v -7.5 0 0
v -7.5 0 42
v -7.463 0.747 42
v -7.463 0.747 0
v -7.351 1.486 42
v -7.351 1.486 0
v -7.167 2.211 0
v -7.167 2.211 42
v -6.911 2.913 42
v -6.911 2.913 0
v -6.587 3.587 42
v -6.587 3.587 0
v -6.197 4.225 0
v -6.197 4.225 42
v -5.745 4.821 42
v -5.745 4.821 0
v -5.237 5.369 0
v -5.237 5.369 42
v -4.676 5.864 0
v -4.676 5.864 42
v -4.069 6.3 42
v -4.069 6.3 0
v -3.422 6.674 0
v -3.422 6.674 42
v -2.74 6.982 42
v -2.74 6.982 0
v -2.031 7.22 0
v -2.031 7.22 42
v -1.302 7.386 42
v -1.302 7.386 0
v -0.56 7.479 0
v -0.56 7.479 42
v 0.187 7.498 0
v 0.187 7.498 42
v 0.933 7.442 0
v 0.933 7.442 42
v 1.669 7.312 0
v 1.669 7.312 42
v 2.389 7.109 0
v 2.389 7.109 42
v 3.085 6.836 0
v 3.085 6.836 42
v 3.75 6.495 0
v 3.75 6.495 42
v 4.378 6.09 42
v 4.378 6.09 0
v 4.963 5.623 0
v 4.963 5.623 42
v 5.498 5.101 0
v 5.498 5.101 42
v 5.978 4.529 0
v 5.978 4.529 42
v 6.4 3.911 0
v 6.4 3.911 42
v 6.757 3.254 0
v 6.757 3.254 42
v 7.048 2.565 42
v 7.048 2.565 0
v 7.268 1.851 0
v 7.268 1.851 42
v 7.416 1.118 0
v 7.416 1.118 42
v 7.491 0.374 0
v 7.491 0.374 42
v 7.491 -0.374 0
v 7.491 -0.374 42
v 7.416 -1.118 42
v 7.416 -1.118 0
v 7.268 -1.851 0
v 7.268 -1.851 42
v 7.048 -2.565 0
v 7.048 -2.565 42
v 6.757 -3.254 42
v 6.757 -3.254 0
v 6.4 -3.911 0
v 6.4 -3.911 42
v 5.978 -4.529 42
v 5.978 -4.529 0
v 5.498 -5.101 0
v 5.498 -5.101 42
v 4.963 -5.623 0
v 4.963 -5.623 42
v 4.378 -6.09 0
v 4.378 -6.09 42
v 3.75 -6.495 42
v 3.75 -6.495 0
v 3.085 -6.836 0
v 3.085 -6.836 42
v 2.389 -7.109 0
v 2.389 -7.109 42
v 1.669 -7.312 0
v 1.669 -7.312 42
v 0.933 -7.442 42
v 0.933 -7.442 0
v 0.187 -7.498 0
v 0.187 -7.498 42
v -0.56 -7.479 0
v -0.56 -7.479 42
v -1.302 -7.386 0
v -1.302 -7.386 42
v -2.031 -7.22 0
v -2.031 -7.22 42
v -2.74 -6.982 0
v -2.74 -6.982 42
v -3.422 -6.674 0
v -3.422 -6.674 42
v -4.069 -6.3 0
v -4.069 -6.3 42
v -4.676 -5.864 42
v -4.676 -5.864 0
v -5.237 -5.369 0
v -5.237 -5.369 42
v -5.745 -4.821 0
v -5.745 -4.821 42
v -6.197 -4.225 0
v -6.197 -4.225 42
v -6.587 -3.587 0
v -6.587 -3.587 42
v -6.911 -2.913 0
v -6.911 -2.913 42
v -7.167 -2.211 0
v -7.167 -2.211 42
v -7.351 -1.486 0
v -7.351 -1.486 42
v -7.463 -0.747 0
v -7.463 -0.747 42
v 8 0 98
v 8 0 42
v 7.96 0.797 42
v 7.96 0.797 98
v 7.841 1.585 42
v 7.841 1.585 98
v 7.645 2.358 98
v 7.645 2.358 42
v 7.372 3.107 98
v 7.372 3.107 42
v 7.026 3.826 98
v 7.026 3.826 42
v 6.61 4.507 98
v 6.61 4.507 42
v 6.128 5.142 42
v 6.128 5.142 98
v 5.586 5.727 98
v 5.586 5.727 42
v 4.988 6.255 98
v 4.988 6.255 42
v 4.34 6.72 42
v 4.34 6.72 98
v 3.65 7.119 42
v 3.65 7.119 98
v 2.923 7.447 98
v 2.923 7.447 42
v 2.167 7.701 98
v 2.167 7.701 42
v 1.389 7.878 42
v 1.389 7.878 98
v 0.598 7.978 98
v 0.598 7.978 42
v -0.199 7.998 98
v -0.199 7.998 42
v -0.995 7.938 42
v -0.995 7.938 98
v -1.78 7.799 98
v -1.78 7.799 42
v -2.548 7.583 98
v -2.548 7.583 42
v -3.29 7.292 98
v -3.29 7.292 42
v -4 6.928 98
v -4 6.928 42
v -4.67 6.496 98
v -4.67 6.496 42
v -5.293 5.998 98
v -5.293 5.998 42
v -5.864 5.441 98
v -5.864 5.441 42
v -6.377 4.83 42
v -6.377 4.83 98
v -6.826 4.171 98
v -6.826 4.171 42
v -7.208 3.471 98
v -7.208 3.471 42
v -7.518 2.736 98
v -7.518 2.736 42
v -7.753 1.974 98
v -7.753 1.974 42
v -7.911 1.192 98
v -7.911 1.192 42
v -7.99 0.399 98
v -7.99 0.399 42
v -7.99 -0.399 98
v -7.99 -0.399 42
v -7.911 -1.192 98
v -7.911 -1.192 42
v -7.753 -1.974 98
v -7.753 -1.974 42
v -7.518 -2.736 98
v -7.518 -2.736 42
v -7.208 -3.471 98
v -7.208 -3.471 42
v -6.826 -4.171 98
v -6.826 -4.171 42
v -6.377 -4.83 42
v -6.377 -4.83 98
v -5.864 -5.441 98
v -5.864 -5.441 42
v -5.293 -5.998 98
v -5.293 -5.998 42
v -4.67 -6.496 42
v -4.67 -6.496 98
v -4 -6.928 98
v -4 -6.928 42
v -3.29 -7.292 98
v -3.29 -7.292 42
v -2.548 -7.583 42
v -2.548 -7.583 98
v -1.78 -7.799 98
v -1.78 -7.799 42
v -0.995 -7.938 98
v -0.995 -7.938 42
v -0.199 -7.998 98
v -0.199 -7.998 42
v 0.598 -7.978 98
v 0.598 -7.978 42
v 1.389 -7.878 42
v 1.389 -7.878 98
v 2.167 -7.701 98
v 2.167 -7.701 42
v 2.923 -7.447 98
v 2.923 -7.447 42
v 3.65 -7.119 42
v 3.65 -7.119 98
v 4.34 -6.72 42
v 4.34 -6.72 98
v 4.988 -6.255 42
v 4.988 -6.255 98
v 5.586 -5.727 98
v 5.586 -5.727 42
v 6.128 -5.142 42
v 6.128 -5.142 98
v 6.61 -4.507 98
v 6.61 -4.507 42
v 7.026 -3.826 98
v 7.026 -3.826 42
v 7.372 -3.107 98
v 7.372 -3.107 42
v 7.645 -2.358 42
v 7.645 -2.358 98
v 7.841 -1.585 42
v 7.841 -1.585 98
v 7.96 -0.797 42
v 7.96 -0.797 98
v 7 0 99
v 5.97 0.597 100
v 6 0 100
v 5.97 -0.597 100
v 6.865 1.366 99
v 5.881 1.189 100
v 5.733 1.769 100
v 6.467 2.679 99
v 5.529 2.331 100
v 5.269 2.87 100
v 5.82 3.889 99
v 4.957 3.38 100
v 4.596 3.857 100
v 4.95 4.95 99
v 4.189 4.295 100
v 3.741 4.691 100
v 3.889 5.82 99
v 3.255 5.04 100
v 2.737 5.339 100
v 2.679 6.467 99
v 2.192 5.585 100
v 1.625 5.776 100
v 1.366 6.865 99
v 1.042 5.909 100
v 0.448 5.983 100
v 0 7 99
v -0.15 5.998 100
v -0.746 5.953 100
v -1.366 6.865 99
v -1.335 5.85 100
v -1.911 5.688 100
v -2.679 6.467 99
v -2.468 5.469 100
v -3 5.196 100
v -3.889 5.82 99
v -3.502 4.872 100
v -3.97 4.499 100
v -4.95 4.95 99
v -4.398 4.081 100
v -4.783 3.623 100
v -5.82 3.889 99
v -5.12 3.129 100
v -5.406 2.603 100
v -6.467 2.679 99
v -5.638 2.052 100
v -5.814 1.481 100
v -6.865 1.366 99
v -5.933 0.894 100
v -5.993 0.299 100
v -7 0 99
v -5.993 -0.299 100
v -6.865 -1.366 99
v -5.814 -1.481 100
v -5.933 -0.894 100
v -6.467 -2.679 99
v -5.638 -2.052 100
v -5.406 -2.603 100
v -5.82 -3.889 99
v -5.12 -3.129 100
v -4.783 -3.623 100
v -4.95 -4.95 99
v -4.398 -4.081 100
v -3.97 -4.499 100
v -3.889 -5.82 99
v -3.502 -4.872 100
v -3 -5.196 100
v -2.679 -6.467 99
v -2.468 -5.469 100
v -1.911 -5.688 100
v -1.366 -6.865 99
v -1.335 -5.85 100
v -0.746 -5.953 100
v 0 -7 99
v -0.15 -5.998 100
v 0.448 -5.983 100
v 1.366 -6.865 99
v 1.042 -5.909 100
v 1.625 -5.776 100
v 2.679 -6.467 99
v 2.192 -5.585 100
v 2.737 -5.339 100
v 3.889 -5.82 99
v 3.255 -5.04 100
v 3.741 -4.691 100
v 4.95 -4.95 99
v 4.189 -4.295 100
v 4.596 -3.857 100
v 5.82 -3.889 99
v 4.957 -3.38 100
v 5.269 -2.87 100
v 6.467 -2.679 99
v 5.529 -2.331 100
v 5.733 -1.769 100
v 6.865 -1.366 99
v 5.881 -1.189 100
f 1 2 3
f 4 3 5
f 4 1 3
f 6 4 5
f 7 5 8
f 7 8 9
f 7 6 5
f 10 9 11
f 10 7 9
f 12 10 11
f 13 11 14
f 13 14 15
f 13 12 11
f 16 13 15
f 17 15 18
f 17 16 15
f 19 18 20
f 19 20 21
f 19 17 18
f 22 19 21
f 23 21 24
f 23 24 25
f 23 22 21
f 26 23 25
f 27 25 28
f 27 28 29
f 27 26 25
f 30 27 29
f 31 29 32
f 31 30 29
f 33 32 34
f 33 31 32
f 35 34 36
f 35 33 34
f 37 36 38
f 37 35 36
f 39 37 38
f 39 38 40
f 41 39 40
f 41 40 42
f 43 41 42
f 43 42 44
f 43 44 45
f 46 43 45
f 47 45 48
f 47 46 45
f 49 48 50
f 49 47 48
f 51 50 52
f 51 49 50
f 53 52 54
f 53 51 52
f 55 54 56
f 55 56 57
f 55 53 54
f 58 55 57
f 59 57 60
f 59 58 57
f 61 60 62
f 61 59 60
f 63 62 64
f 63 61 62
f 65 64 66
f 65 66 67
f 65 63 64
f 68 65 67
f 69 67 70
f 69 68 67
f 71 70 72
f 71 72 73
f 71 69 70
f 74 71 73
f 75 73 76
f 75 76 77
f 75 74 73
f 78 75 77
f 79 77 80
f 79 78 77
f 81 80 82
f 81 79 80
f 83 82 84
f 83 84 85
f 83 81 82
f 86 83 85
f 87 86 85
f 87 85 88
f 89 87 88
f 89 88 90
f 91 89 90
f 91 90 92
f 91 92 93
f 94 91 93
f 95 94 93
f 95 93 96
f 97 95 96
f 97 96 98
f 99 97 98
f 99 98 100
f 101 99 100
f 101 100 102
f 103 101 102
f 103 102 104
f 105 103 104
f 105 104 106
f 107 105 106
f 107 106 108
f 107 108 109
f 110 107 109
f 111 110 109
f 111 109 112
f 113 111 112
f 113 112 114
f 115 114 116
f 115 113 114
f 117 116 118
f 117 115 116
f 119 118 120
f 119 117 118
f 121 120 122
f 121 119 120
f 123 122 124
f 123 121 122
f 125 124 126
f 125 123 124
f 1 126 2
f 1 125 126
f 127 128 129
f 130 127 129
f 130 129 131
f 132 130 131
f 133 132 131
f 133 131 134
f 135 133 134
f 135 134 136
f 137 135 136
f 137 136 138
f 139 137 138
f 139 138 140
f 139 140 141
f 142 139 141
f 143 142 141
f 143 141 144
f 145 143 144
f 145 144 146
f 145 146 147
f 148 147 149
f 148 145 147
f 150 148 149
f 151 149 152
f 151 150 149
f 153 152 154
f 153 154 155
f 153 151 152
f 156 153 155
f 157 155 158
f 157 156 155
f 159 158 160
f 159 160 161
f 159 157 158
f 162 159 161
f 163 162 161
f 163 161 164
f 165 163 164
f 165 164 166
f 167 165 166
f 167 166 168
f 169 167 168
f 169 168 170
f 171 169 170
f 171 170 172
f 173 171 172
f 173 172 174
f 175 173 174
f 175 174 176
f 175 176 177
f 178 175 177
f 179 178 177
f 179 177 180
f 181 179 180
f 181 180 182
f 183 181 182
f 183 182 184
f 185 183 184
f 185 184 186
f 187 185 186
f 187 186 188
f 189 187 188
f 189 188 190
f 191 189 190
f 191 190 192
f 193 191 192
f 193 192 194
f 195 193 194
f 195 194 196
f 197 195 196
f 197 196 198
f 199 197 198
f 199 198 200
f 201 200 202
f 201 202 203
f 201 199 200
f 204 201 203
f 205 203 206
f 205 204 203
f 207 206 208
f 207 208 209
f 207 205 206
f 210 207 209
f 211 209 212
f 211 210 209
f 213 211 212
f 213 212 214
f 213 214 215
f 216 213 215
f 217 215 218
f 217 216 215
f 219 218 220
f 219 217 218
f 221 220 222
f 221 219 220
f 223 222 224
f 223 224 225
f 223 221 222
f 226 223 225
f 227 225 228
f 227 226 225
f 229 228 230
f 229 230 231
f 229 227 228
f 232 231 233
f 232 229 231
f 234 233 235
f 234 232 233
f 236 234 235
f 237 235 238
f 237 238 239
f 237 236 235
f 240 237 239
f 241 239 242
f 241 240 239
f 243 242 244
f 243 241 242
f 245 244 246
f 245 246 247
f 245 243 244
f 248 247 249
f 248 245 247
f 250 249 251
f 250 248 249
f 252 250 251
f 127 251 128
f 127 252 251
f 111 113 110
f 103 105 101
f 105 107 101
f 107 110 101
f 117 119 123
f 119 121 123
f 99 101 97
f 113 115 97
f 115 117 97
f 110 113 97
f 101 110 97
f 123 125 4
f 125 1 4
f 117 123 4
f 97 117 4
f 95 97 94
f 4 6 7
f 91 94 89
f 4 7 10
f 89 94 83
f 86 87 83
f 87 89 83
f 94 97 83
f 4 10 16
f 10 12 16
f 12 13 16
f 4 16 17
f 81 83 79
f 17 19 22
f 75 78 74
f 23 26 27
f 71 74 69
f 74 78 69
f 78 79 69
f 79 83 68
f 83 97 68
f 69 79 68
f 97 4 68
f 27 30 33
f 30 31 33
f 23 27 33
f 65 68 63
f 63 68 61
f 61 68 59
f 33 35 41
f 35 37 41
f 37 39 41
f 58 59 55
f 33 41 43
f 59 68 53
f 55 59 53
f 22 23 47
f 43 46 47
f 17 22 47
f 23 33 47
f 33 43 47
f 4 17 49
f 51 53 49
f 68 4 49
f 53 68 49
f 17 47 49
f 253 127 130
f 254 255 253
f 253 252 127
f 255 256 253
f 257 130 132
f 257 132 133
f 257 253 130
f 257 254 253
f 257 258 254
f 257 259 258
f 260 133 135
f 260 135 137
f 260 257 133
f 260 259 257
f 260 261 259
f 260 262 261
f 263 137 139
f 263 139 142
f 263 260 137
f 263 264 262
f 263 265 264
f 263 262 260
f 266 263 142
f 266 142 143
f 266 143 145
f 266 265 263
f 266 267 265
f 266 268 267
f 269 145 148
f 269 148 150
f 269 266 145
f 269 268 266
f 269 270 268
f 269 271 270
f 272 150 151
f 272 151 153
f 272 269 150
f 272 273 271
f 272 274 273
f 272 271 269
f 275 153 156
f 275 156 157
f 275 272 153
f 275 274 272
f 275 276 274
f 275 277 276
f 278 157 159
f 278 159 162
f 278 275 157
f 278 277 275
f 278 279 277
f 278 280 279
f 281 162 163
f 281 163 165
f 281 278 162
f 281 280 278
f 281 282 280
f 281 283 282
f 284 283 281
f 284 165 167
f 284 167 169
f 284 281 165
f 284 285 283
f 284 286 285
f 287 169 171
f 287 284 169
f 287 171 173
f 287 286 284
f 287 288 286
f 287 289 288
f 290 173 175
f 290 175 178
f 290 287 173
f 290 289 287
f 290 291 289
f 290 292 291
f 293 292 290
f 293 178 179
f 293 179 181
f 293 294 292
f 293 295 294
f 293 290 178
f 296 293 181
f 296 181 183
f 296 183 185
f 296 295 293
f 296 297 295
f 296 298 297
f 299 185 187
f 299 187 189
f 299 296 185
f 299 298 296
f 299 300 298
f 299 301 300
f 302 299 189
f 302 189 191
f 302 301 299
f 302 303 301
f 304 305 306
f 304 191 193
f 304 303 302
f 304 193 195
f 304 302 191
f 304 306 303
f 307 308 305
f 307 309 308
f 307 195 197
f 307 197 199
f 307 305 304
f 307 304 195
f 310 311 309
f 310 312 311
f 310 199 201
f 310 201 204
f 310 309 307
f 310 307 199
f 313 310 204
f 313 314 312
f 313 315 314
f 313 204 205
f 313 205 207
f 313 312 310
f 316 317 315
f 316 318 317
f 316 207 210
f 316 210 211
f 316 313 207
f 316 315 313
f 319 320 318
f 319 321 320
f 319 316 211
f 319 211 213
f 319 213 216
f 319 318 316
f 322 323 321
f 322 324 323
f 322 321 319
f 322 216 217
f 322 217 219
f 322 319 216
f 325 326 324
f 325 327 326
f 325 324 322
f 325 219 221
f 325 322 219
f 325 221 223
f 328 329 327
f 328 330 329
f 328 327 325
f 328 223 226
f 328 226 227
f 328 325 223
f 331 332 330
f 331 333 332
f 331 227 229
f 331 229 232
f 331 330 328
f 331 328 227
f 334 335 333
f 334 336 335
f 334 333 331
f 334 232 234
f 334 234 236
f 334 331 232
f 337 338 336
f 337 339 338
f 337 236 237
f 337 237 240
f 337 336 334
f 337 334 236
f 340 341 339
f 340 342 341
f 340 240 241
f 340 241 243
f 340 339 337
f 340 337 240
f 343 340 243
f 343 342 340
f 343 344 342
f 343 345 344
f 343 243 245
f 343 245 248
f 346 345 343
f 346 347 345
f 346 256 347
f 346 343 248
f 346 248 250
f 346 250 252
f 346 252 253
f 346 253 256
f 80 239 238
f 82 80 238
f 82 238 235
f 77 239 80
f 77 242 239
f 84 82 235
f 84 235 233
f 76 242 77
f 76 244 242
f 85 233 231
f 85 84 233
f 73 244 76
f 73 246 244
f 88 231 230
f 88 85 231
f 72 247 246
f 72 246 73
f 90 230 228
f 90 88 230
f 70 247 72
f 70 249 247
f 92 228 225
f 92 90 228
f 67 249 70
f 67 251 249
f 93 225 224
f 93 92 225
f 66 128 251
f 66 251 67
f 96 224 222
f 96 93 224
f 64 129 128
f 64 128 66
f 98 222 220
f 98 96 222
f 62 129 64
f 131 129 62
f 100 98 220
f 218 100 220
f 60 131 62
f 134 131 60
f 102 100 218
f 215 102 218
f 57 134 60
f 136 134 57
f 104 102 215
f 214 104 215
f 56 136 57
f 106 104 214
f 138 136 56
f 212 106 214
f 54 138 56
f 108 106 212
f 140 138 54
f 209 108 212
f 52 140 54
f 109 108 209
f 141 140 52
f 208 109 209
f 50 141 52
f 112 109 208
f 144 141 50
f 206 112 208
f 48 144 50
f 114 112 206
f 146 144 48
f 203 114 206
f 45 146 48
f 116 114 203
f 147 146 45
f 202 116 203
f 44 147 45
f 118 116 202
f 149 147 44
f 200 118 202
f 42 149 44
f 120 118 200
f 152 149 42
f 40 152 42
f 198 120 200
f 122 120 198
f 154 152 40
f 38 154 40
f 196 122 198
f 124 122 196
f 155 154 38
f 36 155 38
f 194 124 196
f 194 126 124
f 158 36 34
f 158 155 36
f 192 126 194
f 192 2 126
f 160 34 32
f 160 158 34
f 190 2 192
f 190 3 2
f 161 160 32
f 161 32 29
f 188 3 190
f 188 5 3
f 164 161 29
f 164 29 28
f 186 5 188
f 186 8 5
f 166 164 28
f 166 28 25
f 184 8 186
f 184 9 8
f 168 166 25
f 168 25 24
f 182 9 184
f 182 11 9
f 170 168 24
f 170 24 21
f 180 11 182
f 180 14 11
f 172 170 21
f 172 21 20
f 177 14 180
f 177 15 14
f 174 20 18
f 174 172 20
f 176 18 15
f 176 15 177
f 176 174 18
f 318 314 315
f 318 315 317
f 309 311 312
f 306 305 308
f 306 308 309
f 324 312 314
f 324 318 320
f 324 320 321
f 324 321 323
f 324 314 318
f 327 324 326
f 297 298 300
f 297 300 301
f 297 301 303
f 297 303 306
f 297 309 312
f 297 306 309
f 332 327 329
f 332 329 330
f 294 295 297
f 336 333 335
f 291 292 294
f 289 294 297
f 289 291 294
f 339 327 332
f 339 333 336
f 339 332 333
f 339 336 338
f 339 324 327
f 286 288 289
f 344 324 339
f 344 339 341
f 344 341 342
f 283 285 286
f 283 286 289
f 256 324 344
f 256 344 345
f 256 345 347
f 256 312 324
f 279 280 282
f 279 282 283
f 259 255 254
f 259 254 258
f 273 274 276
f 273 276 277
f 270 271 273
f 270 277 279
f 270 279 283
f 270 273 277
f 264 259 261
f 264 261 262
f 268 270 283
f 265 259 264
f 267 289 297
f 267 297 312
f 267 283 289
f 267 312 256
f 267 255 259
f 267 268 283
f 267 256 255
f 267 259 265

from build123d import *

# Parameters (mm, degrees)
SKIZZE1_R                       = 10
AUFSATZ_LINEAR_AUSTRAGEN1_DEPTH = 100
SKIZZE2_R                       = 10
SKIZZE2_R_2                     = 8
SCHNITT_LINEAR_AUSTRAGEN1_DEPTH = 68
FASE1_SIZE                      = 2
SKIZZE3_R                       = 10
SKIZZE3_R_2                     = 7.5
SCHNITT_LINEAR_AUSTRAGEN2_DEPTH = 42


with BuildPart() as part:
    # Skizze1 → Aufsatz-Linear austragen1 (new body)
    with BuildSketch(Plane.XY):
        Circle(SKIZZE1_R)
    extrude(amount=AUFSATZ_LINEAR_AUSTRAGEN1_DEPTH)

    # Skizze2 → Schnitt-Linear austragen1 (cut)
    with BuildSketch(Plane.XY.offset(100)):
        Circle(SKIZZE2_R)
        Circle(SKIZZE2_R_2, mode=Mode.SUBTRACT)
    extrude(amount=-SCHNITT_LINEAR_AUSTRAGEN1_DEPTH, mode=Mode.SUBTRACT)

    # Fase1
    fase1_edges = [part.edges().sort_by_distance(p)[0] for p in [
        (-8, 0, 100),
    ]]
    chamfer(fase1_edges, length=FASE1_SIZE)

    # Skizze3 → Schnitt-Linear austragen2 (cut)
    with BuildSketch(Plane(origin=(0, 0, 0), x_dir=(-1, 0, 0), z_dir=(0, 0, -1))):
        Circle(SKIZZE3_R)
        Circle(SKIZZE3_R_2, mode=Mode.SUBTRACT)
    extrude(amount=-SCHNITT_LINEAR_AUSTRAGEN2_DEPTH, mode=Mode.SUBTRACT)


solid = part.part
